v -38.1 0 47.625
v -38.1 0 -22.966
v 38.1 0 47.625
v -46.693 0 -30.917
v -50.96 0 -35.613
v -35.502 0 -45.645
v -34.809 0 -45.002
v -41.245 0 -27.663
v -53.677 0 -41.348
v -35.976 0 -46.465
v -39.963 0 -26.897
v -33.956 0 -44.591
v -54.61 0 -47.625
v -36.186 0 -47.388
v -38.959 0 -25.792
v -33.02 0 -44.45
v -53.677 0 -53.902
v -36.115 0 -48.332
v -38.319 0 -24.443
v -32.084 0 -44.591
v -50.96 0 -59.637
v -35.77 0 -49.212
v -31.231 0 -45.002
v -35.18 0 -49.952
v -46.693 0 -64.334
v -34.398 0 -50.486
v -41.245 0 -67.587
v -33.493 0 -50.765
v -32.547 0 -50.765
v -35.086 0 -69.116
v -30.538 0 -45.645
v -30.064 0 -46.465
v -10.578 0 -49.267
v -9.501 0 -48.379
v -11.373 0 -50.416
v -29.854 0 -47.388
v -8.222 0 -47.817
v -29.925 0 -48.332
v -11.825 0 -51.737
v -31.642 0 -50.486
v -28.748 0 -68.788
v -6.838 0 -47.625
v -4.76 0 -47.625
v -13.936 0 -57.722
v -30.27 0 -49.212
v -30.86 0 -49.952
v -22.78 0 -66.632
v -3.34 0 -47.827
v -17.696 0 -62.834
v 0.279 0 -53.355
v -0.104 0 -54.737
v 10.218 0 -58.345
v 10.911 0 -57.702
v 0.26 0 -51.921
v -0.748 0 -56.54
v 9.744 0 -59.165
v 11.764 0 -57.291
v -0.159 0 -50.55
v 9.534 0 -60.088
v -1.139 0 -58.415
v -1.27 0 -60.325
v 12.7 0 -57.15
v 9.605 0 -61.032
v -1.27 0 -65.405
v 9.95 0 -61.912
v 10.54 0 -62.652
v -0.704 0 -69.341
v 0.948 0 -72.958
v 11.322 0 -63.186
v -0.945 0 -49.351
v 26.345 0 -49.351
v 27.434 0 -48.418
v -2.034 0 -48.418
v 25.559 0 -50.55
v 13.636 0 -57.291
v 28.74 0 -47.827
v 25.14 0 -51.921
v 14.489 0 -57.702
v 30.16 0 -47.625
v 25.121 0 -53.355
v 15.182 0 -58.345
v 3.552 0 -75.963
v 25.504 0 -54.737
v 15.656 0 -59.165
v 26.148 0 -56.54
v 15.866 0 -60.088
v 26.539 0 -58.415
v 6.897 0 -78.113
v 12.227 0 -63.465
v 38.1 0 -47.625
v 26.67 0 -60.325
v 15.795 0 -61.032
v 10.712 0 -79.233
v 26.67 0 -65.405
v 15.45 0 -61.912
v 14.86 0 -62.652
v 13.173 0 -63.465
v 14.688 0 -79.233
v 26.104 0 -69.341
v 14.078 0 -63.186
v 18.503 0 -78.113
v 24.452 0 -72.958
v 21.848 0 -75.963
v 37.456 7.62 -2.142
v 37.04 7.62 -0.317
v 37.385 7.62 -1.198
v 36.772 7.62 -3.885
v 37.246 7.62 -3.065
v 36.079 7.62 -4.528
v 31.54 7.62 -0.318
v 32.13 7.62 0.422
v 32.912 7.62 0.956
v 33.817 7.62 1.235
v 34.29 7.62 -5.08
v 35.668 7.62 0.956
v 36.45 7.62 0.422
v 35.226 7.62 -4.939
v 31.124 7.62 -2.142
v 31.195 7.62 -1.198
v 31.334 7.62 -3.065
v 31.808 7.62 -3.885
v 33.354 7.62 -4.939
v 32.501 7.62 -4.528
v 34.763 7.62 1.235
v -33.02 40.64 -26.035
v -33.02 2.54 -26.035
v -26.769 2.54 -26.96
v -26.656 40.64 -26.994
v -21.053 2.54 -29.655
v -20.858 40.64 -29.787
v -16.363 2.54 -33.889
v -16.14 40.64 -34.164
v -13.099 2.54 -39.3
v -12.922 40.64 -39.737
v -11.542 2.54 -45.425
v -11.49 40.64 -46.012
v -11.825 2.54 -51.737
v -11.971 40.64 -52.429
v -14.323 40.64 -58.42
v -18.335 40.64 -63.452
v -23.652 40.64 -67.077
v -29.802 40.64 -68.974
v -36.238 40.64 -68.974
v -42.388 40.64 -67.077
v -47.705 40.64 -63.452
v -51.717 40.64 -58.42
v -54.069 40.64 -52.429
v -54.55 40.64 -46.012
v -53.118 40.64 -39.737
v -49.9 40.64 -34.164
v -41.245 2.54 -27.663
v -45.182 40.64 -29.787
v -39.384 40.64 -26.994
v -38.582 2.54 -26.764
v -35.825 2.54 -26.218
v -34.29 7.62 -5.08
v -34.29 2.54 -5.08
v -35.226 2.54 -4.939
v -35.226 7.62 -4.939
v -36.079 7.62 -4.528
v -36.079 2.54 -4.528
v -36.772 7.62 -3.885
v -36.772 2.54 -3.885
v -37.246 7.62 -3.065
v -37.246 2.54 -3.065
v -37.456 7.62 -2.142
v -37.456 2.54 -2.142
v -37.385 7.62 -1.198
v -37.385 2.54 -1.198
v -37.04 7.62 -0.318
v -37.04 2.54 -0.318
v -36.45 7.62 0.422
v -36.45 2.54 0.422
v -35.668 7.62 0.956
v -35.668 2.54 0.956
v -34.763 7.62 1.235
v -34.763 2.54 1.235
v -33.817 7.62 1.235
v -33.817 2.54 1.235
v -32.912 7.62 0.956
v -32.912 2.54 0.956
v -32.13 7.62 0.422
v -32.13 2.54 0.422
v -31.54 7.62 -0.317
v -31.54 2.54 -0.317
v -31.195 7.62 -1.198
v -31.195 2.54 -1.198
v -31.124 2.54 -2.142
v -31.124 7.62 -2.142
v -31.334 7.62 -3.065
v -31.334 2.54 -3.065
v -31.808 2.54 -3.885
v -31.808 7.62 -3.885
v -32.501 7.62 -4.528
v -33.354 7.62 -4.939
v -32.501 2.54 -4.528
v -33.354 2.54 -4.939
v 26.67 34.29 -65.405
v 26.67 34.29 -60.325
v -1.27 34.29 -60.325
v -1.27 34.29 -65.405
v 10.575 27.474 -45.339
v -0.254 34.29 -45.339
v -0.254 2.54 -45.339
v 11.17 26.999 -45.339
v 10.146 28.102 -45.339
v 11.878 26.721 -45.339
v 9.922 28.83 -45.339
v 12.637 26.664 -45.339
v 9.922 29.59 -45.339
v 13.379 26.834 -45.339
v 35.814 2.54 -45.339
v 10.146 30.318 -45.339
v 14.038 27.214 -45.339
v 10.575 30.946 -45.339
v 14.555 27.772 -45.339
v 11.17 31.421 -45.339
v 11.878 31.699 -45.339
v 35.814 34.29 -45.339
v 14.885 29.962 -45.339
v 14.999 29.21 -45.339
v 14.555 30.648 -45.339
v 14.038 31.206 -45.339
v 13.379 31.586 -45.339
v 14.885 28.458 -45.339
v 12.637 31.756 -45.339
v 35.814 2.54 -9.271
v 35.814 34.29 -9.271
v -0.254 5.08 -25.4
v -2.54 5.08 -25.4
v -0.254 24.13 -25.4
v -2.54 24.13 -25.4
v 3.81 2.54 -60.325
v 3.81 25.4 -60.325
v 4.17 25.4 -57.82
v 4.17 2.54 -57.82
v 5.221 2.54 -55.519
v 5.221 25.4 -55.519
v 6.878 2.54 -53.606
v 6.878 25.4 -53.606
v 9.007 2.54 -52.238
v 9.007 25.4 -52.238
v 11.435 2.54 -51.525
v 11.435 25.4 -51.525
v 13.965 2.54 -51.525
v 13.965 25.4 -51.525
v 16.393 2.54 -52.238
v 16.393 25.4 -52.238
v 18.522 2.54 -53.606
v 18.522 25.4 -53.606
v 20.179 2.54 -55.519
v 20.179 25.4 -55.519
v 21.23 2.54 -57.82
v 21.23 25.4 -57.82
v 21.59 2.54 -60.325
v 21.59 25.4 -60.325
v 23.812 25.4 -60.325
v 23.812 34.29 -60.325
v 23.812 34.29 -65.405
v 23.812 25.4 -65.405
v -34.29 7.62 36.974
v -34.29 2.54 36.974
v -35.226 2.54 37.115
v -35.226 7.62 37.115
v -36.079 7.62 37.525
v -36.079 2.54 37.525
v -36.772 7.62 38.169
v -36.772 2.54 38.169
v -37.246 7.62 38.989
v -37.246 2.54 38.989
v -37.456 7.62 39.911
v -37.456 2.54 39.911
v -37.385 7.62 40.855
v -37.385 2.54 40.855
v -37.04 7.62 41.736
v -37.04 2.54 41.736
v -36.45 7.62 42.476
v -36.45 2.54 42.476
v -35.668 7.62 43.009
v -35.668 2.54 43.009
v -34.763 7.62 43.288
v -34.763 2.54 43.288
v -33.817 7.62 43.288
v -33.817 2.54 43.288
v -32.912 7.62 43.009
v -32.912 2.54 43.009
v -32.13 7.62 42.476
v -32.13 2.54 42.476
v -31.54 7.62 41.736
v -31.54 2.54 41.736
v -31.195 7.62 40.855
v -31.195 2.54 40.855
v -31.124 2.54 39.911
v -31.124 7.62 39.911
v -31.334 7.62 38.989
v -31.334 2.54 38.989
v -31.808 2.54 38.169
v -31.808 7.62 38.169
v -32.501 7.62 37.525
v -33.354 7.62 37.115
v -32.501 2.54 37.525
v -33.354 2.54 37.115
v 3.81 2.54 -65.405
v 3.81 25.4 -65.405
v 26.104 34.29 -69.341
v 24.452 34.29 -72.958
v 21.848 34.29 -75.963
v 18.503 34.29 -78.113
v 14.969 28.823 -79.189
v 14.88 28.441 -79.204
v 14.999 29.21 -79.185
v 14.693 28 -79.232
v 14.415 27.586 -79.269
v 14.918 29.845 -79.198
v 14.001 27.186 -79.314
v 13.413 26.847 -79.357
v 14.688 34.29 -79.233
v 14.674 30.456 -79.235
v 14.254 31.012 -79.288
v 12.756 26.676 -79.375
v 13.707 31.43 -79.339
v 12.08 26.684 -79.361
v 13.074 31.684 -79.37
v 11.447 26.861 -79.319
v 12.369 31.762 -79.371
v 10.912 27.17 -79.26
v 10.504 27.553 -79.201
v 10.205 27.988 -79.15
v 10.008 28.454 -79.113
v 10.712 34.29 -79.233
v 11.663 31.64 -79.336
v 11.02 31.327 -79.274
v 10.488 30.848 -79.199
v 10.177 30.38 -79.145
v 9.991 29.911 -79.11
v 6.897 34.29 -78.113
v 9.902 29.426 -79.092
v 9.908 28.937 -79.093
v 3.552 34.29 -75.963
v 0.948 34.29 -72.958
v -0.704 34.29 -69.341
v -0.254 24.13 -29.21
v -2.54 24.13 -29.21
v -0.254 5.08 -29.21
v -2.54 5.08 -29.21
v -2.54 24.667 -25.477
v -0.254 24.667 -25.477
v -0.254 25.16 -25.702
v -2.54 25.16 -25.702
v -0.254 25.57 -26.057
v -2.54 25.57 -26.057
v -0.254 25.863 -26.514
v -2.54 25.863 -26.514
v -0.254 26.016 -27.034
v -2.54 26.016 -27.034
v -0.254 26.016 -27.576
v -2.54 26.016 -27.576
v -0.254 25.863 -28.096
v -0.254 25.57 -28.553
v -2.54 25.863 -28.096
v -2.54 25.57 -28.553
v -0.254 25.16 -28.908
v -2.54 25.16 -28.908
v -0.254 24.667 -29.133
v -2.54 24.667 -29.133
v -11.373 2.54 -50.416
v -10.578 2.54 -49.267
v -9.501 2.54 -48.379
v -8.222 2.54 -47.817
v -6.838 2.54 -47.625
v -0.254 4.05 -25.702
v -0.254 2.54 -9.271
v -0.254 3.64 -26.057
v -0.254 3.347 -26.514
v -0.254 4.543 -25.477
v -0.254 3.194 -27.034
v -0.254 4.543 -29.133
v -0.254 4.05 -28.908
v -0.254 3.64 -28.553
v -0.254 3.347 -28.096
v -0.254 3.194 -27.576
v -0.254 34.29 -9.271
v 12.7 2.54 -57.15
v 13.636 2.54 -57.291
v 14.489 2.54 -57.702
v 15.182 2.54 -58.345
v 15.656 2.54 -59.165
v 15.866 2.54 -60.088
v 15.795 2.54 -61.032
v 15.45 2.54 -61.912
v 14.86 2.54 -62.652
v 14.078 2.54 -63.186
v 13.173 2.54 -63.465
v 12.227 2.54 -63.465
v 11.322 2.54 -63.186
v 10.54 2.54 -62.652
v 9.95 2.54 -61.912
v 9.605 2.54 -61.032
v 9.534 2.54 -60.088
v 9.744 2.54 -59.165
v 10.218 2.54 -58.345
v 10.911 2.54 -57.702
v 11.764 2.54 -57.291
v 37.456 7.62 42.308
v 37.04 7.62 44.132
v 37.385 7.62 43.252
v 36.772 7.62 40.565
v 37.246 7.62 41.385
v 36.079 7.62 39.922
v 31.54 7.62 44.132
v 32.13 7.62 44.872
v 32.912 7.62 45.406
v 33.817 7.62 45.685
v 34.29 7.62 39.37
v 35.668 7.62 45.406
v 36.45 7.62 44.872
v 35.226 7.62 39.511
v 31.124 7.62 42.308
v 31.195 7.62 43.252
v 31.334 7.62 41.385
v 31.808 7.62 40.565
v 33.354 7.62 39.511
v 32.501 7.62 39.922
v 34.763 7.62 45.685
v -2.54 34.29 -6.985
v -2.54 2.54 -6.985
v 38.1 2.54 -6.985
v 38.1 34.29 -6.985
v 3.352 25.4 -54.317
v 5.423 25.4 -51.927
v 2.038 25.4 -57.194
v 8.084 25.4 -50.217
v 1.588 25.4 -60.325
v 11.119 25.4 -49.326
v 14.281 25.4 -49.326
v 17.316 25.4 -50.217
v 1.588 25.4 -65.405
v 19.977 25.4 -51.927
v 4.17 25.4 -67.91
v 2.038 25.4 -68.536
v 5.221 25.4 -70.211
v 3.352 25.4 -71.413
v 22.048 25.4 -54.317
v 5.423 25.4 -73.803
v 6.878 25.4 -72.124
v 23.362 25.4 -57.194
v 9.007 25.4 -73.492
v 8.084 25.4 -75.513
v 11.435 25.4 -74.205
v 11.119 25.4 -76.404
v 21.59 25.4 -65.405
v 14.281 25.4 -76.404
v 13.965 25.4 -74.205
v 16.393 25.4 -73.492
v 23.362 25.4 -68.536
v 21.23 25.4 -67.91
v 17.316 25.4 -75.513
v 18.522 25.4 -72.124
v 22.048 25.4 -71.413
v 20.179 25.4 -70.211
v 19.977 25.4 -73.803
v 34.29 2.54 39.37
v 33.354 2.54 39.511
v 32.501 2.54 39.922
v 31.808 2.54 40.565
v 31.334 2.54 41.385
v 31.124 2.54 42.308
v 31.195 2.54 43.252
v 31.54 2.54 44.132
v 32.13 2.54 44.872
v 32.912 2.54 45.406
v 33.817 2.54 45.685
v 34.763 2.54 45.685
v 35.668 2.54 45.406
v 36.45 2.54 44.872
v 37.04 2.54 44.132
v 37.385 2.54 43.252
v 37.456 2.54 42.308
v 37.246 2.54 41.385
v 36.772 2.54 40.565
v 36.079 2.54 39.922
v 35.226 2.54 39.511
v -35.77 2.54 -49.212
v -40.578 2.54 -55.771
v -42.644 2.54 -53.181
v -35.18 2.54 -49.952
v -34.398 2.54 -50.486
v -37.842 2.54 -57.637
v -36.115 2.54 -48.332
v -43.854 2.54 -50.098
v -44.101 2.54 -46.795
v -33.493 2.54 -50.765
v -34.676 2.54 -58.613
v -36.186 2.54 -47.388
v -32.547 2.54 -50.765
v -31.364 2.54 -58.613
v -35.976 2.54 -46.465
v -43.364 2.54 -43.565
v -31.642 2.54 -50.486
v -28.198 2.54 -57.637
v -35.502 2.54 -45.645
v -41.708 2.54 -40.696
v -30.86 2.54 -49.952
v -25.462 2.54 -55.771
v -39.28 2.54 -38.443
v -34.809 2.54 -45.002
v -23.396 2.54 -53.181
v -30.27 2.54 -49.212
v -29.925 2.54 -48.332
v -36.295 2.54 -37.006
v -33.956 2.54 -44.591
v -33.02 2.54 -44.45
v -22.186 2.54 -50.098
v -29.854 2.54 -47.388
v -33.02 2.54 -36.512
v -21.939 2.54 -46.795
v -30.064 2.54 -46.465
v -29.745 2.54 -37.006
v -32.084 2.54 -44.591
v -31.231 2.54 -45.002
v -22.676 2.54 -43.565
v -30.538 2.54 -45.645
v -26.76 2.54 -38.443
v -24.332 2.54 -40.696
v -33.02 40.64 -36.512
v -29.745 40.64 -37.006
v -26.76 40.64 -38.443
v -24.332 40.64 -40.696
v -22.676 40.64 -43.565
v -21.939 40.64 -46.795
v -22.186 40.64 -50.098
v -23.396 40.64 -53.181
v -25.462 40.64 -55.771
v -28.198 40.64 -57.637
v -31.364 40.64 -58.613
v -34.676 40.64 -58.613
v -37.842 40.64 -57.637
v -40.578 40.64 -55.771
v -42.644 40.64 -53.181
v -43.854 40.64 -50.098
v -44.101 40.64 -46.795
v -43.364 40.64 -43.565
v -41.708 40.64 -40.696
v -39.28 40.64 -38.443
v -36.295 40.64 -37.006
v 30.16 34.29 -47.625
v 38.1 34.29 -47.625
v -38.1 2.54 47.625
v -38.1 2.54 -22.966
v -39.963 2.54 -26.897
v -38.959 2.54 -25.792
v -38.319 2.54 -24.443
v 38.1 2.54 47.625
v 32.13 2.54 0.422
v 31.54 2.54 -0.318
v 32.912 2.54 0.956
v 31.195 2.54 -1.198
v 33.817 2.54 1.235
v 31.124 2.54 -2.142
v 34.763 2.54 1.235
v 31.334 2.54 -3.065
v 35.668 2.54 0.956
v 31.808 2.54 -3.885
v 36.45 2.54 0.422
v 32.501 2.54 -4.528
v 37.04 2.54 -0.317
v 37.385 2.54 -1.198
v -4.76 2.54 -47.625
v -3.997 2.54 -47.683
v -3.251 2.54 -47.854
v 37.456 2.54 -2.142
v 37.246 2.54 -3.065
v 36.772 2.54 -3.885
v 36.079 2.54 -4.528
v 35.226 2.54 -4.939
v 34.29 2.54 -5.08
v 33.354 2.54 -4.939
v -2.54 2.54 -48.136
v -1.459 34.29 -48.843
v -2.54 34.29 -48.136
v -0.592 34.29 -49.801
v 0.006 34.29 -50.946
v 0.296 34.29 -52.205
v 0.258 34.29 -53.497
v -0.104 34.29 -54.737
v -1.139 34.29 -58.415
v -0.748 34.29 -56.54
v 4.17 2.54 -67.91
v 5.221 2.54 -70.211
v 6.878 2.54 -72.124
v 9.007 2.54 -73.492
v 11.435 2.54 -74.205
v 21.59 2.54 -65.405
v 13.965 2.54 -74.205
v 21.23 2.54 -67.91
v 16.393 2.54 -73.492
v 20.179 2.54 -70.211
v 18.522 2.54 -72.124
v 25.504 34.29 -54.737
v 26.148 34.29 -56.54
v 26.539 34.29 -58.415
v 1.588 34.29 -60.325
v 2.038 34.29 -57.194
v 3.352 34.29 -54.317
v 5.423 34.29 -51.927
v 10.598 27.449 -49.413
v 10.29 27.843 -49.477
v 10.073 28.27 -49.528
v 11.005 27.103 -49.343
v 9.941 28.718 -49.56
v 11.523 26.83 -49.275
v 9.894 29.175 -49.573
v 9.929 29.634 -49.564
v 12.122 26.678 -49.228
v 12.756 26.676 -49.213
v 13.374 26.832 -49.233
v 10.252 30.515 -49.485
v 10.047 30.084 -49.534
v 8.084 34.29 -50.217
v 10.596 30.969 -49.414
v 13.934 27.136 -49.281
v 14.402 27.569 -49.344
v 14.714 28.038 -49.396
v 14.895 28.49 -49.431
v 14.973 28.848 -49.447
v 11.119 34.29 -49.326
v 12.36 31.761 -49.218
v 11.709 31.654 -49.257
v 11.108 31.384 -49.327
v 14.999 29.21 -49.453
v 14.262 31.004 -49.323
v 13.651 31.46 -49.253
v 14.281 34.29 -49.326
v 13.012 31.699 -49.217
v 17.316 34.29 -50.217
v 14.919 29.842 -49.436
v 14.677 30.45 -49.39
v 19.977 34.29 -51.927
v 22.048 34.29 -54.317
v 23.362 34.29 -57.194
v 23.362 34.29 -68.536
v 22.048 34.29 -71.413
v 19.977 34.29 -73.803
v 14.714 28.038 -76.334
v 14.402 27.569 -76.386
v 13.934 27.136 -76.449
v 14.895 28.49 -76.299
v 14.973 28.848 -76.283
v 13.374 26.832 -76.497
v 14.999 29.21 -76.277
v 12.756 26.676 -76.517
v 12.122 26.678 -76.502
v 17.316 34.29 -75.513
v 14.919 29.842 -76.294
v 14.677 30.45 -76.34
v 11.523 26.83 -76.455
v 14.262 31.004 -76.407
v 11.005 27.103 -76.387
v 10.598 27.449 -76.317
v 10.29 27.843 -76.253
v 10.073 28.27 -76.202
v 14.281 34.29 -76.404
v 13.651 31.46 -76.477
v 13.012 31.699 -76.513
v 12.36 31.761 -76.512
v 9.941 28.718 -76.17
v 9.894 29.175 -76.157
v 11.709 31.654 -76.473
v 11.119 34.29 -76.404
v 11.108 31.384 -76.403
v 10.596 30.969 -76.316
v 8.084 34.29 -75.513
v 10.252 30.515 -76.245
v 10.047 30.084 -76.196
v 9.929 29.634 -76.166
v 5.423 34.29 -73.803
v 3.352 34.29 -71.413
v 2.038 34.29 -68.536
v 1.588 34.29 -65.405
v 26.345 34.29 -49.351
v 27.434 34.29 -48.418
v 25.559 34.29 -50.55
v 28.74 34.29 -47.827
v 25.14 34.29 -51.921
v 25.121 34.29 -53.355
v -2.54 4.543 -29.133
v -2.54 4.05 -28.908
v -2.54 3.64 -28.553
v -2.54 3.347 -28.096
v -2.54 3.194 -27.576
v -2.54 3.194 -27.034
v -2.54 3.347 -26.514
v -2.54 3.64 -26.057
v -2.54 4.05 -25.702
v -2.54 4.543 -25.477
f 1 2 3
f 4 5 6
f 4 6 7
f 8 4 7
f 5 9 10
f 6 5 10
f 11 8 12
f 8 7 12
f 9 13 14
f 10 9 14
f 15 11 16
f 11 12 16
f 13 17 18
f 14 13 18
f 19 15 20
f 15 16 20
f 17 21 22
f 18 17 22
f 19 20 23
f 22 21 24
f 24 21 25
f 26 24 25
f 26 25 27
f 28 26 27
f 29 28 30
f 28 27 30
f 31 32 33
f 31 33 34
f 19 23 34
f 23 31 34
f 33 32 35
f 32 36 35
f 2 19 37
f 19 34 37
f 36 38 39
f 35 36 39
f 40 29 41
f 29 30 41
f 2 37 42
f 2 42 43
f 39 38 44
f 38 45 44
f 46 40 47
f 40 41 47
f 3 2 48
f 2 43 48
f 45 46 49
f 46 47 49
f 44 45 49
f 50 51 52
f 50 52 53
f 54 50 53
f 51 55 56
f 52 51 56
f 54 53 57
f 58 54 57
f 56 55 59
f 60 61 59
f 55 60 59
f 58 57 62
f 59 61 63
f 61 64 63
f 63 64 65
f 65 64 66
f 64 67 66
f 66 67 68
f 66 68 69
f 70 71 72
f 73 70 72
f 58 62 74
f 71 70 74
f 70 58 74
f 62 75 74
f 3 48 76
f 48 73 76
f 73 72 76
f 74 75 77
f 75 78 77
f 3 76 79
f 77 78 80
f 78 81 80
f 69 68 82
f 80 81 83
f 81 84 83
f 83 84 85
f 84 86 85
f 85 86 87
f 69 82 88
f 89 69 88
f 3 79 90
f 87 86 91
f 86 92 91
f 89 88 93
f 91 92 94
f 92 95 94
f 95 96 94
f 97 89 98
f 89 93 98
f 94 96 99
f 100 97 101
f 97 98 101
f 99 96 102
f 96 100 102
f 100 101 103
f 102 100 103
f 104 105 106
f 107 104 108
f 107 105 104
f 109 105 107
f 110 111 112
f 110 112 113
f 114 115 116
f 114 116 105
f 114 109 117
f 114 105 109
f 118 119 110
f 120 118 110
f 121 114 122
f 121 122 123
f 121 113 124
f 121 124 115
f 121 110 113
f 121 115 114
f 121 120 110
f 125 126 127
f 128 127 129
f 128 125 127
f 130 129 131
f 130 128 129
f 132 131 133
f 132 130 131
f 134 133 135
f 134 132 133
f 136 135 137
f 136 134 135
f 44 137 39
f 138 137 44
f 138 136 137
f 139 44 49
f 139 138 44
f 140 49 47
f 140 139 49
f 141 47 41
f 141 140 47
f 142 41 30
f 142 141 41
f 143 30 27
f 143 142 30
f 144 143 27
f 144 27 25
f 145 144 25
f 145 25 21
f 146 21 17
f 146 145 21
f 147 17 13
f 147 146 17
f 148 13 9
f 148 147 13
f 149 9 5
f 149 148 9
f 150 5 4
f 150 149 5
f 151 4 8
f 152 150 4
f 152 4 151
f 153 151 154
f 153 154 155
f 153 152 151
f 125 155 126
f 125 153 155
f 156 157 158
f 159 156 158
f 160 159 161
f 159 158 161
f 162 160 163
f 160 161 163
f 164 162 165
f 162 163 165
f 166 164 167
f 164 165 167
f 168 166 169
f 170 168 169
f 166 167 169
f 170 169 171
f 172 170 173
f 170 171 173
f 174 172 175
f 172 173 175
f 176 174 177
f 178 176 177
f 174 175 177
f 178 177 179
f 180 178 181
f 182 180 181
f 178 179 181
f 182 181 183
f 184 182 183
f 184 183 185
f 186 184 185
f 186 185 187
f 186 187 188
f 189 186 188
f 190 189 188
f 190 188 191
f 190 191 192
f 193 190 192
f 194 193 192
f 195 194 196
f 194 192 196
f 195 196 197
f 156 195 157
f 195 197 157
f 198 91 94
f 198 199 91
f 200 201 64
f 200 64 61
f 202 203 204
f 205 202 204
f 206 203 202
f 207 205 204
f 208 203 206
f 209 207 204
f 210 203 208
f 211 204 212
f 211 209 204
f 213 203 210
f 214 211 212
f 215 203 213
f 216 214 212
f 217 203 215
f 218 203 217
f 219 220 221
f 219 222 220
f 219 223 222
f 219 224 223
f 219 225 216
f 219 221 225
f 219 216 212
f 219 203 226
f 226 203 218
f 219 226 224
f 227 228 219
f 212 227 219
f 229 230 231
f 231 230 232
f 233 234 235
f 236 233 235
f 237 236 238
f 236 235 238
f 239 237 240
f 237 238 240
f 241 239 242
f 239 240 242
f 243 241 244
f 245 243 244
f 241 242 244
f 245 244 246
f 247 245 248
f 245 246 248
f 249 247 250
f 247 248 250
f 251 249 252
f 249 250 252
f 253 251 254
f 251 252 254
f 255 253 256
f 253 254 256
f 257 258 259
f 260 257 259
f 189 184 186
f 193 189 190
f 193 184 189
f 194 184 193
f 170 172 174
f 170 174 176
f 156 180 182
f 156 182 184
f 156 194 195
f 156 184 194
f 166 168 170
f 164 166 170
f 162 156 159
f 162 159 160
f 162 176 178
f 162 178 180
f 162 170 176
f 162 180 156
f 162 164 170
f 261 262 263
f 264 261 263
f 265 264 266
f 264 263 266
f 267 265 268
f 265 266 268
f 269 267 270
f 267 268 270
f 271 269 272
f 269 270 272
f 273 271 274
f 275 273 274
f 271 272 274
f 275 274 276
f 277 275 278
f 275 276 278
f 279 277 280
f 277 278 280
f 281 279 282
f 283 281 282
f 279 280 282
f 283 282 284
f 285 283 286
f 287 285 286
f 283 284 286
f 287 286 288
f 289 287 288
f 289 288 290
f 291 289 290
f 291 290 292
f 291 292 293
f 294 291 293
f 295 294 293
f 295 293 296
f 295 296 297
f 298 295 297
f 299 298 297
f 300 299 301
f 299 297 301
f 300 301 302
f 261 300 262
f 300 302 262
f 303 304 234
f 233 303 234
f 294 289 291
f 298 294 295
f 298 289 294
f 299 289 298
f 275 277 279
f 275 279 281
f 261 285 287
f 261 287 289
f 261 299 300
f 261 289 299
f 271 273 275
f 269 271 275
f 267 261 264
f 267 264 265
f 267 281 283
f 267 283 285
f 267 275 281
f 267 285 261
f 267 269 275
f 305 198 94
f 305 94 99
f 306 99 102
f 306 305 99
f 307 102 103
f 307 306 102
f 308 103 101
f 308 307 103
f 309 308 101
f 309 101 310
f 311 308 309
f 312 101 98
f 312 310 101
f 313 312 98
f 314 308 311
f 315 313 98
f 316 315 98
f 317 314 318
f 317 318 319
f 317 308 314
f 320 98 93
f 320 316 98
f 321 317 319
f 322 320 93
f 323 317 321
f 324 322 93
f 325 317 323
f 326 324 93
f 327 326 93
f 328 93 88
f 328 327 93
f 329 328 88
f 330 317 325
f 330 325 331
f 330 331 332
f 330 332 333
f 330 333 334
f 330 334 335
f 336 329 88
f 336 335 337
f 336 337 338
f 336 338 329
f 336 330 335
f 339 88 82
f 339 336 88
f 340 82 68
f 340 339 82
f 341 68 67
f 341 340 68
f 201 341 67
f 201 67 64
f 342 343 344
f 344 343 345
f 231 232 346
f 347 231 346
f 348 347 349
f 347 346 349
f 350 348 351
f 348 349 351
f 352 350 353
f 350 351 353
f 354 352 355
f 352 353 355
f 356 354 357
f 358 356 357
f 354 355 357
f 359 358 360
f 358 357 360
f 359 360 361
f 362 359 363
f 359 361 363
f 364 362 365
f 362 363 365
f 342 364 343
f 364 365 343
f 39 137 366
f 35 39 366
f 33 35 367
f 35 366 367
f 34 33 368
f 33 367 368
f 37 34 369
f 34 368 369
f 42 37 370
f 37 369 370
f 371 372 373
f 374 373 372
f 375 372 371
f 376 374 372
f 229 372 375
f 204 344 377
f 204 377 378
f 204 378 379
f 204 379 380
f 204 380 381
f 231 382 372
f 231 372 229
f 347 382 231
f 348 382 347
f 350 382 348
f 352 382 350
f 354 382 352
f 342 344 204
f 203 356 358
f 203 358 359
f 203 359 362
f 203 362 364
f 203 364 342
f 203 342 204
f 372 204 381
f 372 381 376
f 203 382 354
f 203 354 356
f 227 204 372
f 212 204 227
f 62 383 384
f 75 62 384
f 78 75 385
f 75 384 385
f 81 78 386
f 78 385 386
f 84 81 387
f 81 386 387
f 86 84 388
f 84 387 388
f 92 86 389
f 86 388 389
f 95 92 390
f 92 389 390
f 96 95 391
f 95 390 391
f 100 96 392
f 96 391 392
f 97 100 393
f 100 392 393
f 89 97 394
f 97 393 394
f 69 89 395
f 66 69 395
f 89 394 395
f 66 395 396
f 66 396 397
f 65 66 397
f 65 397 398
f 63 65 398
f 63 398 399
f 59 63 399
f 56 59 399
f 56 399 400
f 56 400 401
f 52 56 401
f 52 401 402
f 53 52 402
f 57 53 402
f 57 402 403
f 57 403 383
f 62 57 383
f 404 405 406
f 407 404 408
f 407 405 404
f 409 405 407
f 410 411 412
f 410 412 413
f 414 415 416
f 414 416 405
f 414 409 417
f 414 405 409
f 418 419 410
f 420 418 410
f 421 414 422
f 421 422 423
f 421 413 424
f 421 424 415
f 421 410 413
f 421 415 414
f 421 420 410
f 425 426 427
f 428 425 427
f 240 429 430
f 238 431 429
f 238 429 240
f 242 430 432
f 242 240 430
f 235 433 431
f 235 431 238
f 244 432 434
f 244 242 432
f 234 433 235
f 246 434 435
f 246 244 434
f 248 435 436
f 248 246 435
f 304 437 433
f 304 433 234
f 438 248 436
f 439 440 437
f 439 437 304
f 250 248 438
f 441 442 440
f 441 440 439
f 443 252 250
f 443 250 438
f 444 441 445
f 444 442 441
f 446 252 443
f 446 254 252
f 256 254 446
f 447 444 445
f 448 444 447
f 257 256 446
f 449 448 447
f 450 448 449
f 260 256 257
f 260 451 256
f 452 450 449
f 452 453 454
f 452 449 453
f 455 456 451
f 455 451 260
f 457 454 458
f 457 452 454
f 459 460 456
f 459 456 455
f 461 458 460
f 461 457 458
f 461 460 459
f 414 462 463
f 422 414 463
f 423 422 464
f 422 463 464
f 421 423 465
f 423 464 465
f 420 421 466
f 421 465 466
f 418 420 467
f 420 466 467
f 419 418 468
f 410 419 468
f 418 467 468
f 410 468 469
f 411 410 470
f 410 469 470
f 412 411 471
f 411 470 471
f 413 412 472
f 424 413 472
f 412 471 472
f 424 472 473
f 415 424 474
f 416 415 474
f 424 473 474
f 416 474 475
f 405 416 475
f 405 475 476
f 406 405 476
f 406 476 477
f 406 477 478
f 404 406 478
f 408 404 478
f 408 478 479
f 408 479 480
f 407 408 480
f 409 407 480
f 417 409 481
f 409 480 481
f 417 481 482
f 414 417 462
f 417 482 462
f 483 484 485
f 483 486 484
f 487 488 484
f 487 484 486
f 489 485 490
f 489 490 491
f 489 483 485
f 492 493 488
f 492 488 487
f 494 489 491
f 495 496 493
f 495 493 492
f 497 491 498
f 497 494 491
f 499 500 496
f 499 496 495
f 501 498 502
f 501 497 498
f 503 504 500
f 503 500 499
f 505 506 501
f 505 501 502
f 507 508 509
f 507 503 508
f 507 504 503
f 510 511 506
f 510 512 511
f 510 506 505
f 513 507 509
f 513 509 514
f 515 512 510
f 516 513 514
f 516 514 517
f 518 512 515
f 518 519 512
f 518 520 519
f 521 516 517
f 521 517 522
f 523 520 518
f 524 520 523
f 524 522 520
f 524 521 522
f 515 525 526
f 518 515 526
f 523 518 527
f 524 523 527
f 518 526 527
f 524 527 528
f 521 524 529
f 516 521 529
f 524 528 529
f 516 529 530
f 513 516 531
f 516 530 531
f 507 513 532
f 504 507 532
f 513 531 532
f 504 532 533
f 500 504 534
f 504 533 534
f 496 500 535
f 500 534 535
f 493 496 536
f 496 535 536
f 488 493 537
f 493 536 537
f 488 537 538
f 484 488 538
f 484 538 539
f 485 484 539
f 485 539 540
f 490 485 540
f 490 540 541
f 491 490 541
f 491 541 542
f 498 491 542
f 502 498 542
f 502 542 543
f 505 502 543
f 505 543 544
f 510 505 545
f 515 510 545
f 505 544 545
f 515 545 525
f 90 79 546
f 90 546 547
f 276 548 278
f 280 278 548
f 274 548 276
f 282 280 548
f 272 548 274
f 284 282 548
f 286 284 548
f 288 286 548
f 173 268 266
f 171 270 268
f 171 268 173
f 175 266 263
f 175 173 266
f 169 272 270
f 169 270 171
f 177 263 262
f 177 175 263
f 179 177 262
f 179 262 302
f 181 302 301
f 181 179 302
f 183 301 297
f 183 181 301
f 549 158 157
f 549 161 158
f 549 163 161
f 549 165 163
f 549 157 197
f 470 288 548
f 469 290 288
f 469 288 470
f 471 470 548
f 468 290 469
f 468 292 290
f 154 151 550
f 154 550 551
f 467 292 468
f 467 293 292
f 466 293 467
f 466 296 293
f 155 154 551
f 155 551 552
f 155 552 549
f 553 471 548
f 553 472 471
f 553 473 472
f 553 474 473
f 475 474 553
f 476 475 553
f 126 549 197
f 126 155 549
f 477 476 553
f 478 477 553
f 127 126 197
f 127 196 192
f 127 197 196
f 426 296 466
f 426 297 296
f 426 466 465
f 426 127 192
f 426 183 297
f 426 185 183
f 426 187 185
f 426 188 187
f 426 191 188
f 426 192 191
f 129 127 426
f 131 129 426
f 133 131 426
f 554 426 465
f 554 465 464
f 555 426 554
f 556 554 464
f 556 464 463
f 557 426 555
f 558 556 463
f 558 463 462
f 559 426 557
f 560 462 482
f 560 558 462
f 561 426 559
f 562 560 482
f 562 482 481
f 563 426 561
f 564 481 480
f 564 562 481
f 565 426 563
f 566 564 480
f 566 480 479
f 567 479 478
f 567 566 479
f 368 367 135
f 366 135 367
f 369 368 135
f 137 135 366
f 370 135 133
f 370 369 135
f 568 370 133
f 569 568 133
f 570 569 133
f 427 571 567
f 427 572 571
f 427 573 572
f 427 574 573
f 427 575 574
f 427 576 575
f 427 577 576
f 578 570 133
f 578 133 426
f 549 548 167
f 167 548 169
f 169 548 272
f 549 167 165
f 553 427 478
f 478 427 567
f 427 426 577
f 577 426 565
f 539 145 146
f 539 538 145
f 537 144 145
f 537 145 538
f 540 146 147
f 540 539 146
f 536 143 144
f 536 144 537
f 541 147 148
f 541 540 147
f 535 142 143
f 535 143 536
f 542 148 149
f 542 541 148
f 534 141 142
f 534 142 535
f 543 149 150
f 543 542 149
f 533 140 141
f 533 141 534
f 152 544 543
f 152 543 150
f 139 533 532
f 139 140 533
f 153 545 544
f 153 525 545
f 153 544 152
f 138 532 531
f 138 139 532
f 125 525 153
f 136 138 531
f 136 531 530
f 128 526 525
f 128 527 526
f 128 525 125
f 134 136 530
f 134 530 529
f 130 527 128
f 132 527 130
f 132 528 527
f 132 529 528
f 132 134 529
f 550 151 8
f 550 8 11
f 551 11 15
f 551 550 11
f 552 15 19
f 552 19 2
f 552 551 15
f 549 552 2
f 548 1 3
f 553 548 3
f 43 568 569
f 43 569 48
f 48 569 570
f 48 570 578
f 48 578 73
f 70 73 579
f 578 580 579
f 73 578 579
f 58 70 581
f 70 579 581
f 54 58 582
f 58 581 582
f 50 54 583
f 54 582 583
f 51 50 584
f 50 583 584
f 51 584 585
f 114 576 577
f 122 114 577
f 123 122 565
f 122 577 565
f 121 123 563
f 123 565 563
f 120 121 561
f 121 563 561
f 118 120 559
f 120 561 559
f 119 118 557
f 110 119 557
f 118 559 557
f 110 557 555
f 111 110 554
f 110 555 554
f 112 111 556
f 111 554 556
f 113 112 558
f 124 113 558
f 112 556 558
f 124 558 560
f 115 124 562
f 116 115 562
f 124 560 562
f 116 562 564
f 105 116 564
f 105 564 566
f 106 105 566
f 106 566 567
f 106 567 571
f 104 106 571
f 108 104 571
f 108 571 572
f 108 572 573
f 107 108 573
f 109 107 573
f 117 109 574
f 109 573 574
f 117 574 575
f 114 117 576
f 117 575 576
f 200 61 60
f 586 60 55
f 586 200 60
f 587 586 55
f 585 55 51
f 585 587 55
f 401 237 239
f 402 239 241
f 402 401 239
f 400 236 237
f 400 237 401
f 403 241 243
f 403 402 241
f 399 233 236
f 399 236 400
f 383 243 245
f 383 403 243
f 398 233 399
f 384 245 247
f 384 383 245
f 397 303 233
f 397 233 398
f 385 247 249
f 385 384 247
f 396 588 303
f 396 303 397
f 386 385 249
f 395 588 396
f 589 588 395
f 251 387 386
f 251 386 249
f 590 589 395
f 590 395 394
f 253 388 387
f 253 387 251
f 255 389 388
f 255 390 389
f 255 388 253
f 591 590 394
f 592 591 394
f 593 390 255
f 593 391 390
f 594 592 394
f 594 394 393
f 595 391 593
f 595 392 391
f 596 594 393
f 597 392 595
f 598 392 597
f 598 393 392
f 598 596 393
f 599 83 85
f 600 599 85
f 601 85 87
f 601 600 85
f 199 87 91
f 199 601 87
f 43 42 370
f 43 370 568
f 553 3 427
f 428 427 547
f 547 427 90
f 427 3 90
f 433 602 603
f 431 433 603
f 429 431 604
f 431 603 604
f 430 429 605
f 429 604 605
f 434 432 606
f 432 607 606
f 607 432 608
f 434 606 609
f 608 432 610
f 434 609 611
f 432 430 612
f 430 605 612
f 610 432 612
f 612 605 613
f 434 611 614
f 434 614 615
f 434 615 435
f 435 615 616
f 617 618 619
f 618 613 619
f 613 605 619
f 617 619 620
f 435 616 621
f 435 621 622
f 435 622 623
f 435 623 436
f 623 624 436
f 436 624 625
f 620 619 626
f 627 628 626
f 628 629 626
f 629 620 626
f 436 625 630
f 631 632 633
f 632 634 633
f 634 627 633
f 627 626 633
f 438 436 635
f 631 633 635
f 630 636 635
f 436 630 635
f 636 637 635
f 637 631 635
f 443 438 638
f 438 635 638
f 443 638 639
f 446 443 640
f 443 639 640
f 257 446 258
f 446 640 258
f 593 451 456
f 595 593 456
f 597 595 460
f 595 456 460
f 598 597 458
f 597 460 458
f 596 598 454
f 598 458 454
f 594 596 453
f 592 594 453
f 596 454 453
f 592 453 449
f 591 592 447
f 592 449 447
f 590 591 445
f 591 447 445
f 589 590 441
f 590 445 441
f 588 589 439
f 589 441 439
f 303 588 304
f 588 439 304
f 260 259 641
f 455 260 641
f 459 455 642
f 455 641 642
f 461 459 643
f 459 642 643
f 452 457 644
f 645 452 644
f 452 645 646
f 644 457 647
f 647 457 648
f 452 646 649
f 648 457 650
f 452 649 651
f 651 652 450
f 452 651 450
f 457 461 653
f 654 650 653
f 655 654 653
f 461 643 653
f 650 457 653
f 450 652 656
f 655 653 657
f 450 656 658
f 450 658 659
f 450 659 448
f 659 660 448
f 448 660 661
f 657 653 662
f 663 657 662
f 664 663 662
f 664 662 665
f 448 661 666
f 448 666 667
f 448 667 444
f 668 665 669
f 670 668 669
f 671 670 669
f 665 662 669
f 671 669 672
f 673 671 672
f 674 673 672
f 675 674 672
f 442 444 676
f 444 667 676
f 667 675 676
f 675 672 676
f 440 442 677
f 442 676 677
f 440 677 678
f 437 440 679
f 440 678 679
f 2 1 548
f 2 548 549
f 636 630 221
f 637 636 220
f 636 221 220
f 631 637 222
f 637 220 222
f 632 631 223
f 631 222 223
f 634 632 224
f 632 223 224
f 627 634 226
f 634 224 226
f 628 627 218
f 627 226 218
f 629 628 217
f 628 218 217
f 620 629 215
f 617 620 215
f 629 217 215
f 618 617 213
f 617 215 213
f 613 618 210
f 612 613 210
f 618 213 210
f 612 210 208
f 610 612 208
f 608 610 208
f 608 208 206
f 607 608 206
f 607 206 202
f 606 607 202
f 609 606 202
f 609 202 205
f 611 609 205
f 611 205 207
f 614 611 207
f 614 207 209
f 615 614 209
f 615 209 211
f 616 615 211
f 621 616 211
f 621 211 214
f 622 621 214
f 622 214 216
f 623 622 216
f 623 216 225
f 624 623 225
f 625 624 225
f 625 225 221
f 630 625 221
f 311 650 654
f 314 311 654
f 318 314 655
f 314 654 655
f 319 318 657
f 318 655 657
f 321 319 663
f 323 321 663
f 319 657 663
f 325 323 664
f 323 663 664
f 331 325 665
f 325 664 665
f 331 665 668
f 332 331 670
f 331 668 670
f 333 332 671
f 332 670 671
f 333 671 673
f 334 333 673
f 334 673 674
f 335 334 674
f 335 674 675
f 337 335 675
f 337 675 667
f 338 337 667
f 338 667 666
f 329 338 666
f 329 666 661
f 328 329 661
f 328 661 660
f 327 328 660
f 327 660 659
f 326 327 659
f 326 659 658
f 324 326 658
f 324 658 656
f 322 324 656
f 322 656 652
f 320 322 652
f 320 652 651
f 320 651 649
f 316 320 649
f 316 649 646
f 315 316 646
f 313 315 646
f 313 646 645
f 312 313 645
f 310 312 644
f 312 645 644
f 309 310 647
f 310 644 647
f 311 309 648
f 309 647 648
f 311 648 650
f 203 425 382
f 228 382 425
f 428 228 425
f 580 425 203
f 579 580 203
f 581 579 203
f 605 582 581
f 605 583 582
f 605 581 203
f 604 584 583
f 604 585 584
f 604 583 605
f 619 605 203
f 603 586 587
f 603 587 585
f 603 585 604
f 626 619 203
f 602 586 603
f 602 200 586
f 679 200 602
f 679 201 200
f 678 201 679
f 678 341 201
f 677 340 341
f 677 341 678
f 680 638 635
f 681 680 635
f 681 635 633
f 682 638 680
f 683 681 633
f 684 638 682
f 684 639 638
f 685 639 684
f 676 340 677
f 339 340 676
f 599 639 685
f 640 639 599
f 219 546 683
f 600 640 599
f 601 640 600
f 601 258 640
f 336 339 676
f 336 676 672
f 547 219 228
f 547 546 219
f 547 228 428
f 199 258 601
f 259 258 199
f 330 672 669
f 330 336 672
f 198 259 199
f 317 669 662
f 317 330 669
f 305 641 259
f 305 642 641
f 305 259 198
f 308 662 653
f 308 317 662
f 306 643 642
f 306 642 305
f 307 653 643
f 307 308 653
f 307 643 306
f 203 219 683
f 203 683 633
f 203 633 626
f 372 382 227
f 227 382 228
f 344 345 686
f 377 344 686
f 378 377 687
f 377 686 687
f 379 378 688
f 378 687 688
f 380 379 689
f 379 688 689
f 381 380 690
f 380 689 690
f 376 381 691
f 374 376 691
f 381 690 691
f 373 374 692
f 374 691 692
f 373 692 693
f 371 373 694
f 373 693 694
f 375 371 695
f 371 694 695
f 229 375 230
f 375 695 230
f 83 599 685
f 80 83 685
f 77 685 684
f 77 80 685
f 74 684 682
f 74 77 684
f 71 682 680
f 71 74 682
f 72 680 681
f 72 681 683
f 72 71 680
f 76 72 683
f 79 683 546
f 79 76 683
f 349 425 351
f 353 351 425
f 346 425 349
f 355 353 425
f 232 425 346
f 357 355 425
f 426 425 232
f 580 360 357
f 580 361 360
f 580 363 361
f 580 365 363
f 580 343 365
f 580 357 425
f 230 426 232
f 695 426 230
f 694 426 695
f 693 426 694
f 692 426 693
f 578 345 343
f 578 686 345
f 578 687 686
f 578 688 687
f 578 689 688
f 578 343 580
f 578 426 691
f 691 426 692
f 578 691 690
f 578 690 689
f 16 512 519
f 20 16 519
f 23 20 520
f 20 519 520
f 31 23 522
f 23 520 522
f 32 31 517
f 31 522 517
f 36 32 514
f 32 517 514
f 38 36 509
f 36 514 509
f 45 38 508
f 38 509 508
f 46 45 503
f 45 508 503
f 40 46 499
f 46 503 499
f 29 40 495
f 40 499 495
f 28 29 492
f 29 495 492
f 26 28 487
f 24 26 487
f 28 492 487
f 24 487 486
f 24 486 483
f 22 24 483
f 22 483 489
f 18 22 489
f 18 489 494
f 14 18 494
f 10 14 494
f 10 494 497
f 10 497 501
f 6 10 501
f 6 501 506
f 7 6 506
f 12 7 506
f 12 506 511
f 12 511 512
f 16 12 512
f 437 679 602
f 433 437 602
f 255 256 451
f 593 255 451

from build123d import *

# Parameters (mm, degrees)
SKETCH1_W                = 76.2
SKETCH1_H                = 95.25
BOSS_EXTRUDE1_DEPTH      = 2.54
SKETCH2_W                = 40.64
SKETCH2_H                = 40.64
BOSS_EXTRUDE2_DEPTH      = 31.75
SKETCH3_W                = 36.068
SKETCH3_H                = 36.068
CUT_EXTRUDE1_DEPTH       = 31.75
SKETCH4_R                = 3.175
BOSS_EXTRUDE3_DEPTH      = 5.08
CUT_EXTRUDE2_REACH       = 42.64
BOSS_EXTRUDE4_DEPTH      = 31.75
BOSS_EXTRUDE4_DEPTH_BACK = 2.54
FILLET1_R                = 5.08
CUT_EXTRUDE3_DEPTH       = 31.75
CUT_EXTRUDE4_DEPTH       = 8.89
SKETCH9_R                = 21.59
BOSS_EXTRUDE5_DEPTH      = 38.1
BOSS_EXTRUDE5_DEPTH_BACK = 2.54
SKETCH10_R               = 11.1125
CUT_EXTRUDE5_DEPTH       = 38.1
CUT_EXTRUDE6_REACH       = 4.54
SKETCH11_R               = 3.175
FILLET2_R                = 5.08
SKETCH13_R               = 2.5527
CUT_EXTRUDE7_DEPTH       = 35.036


with BuildPart() as part:
    # Sketch1 → Boss-Extrude1 (new body)
    with BuildSketch(Plane(origin=(0, 0, 0), x_dir=(1, 0, 0), z_dir=(0, 1, 0))):
        Rectangle(SKETCH1_W, SKETCH1_H)
    extrude(amount=BOSS_EXTRUDE1_DEPTH)

    # Sketch2 → Boss-Extrude2 (add)
    with BuildSketch(Plane(origin=(0, 2.54, 0), x_dir=(1, 0, 0), z_dir=(0, 1, 0))):
        with Locations((17.78, 27.305)):
            Rectangle(SKETCH2_W, SKETCH2_H)
    extrude(amount=BOSS_EXTRUDE2_DEPTH)

    # Sketch3 → Cut-Extrude1 (cut)
    with BuildSketch(Plane(origin=(0, 34.29, 0), x_dir=(1, 0, 0), z_dir=(0, 1, 0))):
        with Locations((17.78, 27.305)):
            Rectangle(SKETCH3_W, SKETCH3_H)
    extrude(amount=-CUT_EXTRUDE1_DEPTH, mode=Mode.SUBTRACT)

    # Sketch4 → Boss-Extrude3 (add)
    with BuildSketch(Plane(origin=(0, 2.54, 0), x_dir=(1, 0, 0), z_dir=(0, 1, 0))):
        with Locations(Location((34.29, 1.905, 0), (0, 0, 90))):  # turned: the seam where the file's is
            Circle(SKETCH4_R)
        with Locations(Location((34.29, -42.545, 0), (0, 0, 90))):  # turned: the seam where the file's is
            Circle(SKETCH4_R)
        with Locations(Location((-34.29, 1.905, 0), (0, 0, 90))):  # turned: the seam where the file's is
            Circle(SKETCH4_R)
        with Locations(Location((-34.29, -40.148547917, 0), (0, 0, 90))):  # turned: the seam where the file's is
            Circle(SKETCH4_R)
    extrude(amount=BOSS_EXTRUDE3_DEPTH)

    # Sketch5 → Cut-Extrude2 (cut, up to next)
    with BuildSketch(Plane.ZY.offset(2.54), mode=Mode.PRIVATE) as cut_extrude2_sk1:
        with BuildLine():
            Line((-29.21, 24.13), (-29.21, 5.08))
            ThreePointArc((-29.21, 5.08), (-27.305, 3.175), (-25.4, 5.08))
            Line((-25.4, 5.08), (-25.4, 24.13))
            ThreePointArc((-25.4, 24.13), (-27.305, 26.035), (-29.21, 24.13))
        make_face()
    cut_extrude2_tool1 = extrude(cut_extrude2_sk1.sketch, amount=-CUT_EXTRUDE2_REACH, mode=Mode.PRIVATE) & part.part
    add(cut_extrude2_tool1.solids().sort_by_distance((-2.54, 14.605, -27.305))[0], mode=Mode.SUBTRACT)

    # Sketch6 → Boss-Extrude4 (add, two sides)
    with BuildSketch(Plane(origin=(0, 2.54, 0), x_dir=(1, 0, 0), z_dir=(0, 1, 0))) as boss_extrude4_sk:
        with BuildLine():
            Line((26.67, 60.325), (26.67, 65.405))
            ThreePointArc((26.67, 65.405), (12.7, 79.375), (-1.27, 65.405))
            Line((-1.27, 65.405), (-1.27, 60.325))
            ThreePointArc((-1.27, 60.325), (12.7, 46.355), (26.67, 60.325))
        make_face()
    extrude(amount=BOSS_EXTRUDE4_DEPTH)
    extrude(boss_extrude4_sk.sketch, amount=-BOSS_EXTRUDE4_DEPTH_BACK)

    # Fillet1
    fillet1_edges = [part.edges().sort_by_distance(p)[0] for p in [
        (18.519871133, 17.145, -47.625),
        (6.880128867, 17.145, -47.625),
    ]]
    fillet(fillet1_edges, radius=FILLET1_R)

    # Sketch7 → Cut-Extrude3 (cut)
    with BuildSketch(Plane(origin=(0, 34.29, 0), x_dir=(1, 0, 0), z_dir=(0, 1, 0))):
        with BuildLine():
            Line((21.59, 60.325), (21.59, 65.405))
            ThreePointArc((21.59, 65.405), (12.7, 74.295), (3.81, 65.405))
            Line((3.81, 65.405), (3.81, 60.325))
            ThreePointArc((3.81, 60.325), (12.7, 51.435), (21.59, 60.325))
        make_face()
    extrude(amount=-CUT_EXTRUDE3_DEPTH, mode=Mode.SUBTRACT)

    # Sketch8 → Cut-Extrude4 (cut)
    with BuildSketch(Plane(origin=(0, 34.29, 0), x_dir=(1, 0, 0), z_dir=(0, 1, 0))):
        with BuildLine():
            Line((23.8125, 60.325), (23.8125, 65.405))
            ThreePointArc((23.8125, 65.405), (12.7, 76.5175), (1.5875, 65.405))
            Line((1.5875, 65.405), (1.5875, 60.325))
            ThreePointArc((1.5875, 60.325), (12.7, 49.2125), (23.8125, 60.325))
        make_face()
    extrude(amount=-CUT_EXTRUDE4_DEPTH, mode=Mode.SUBTRACT)

    # Sketch9 → Boss-Extrude5 (add, two sides)
    with BuildSketch(Plane(origin=(0, 2.54, 0), x_dir=(1, 0, 0), z_dir=(0, 1, 0))) as boss_extrude5_sk:
        with Locations(Location((-33.02, 47.625, 0), (0, 0, 270))):  # turned: the seam where the file's is
            Circle(SKETCH9_R)
    extrude(amount=BOSS_EXTRUDE5_DEPTH)
    extrude(boss_extrude5_sk.sketch, amount=-BOSS_EXTRUDE5_DEPTH_BACK)

    # Sketch10 → Cut-Extrude5 (cut)
    with BuildSketch(Plane(origin=(0, 40.64, 0), x_dir=(1, 0, 0), z_dir=(0, 1, 0))):
        with Locations(Location((-33.02, 47.625, 0), (0, 0, 270))):  # turned: the seam where the file's is
            Circle(SKETCH10_R)
    extrude(amount=-CUT_EXTRUDE5_DEPTH, mode=Mode.SUBTRACT)

    # Sketch11 → Cut-Extrude6 (cut, up to next)
    with BuildSketch(Plane(origin=(0, 2.54, 0), x_dir=(1, 0, 0), z_dir=(0, 1, 0)), mode=Mode.PRIVATE) as cut_extrude6_sk1:
        with Locations(Location((12.7, 60.325, 0), (0, 0, 270))):  # turned: the seam where the file's is
            Circle(SKETCH11_R)
    cut_extrude6_tool1 = extrude(cut_extrude6_sk1.sketch, amount=-CUT_EXTRUDE6_REACH, mode=Mode.PRIVATE) & part.part
    add(cut_extrude6_tool1.solids().sort_by_distance((12.7, 2.54, -60.325))[0], mode=Mode.SUBTRACT)
    # Sketch11 → Cut-Extrude6 (cut, up to next)
    with BuildSketch(Plane(origin=(0, 2.54, 0), x_dir=(1, 0, 0), z_dir=(0, 1, 0)), mode=Mode.PRIVATE) as cut_extrude6_sk2:
        with Locations(Location((-33.02, 47.625, 0), (0, 0, 270))):  # turned: the seam where the file's is
            Circle(SKETCH11_R)
    cut_extrude6_tool2 = extrude(cut_extrude6_sk2.sketch, amount=-CUT_EXTRUDE6_REACH, mode=Mode.PRIVATE) & part.part
    add(cut_extrude6_tool2.solids().sort_by_distance((-33.02, 2.54, -47.625))[0], mode=Mode.SUBTRACT)

    # Fillet2
    fillet2_edges = [part.edges().sort_by_distance(p)[0] for p in [
        (-11.43, 1.27, -47.625),
        (-38.1, 1.27, -26.641156215),
    ]]
    fillet(fillet2_edges, radius=FILLET2_R)

    # Sketch13 → Cut-Extrude7 (cut, through all)
    with BuildSketch(Plane.XY.offset(-45.339)):
        with Locations((12.446, 29.21)):
            Circle(SKETCH13_R)
    extrude(amount=-CUT_EXTRUDE7_DEPTH, mode=Mode.SUBTRACT)


solid = part.part
